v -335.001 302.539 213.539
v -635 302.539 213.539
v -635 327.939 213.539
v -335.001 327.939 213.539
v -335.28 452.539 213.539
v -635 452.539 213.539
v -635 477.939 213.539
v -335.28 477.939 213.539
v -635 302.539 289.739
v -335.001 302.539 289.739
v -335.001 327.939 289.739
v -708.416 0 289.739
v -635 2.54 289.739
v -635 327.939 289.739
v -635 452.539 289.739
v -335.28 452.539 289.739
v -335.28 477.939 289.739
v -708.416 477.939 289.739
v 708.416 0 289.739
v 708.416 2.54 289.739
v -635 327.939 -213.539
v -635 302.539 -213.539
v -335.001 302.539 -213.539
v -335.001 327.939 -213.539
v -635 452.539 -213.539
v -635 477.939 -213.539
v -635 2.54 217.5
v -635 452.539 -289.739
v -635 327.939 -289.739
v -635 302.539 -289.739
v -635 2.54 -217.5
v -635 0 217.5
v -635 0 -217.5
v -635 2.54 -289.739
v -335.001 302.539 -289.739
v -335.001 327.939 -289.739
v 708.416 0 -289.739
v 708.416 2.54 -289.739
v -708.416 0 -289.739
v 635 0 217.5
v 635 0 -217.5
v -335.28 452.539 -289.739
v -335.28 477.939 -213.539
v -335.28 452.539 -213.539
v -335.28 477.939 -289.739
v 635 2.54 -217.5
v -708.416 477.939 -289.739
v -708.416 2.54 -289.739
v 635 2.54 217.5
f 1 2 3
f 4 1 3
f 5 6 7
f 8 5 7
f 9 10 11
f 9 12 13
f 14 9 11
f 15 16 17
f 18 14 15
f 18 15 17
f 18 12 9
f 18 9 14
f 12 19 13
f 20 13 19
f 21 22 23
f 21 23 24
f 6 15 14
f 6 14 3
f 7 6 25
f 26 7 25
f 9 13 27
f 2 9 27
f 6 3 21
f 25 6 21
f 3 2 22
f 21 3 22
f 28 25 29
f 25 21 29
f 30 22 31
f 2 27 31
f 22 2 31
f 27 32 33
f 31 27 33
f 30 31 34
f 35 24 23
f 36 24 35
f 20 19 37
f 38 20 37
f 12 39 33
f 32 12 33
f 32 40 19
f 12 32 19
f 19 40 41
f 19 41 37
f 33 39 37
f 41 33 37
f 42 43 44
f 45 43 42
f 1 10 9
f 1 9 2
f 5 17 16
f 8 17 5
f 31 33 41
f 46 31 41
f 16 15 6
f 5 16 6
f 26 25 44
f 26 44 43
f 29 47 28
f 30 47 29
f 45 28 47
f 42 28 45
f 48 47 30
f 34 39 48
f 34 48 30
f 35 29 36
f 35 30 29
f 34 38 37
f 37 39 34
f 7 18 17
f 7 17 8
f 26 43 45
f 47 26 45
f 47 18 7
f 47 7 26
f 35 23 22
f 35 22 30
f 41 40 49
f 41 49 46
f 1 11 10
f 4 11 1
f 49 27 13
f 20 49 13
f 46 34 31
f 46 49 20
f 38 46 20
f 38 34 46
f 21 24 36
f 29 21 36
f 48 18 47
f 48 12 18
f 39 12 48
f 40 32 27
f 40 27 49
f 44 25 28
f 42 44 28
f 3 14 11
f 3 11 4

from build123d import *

# Parameters (mm, degrees)
SKETCH1_W           = 1416.83235241
SKETCH1_H           = 579.478309122
SKETCH1_W_2         = 1270
SKETCH1_H_2         = 434.999892
BOSS_EXTRUDE1_DEPTH = 2.54
SKETCH2_W           = 73.416176205
SKETCH2_H           = 579.478309122
BOSS_EXTRUDE2_DEPTH = 327.9394
SKETCH3_W           = 76.2
SKETCH3_H           = 25.4
BOSS_EXTRUDE3_DEPTH = 299.9994
SKETCH4_W           = 73.416176205
SKETCH4_H           = 579.478309122
BOSS_EXTRUDE4_DEPTH = 149.999954
SKETCH5_W           = 76.2
SKETCH5_H           = 25.4
BOSS_EXTRUDE5_DEPTH = 299.72


with BuildPart() as part:
    # Sketch1 → Boss-Extrude1 (new body)
    with BuildSketch(Plane(origin=(0, 0, 0), x_dir=(1, 0, 0), z_dir=(0, 1, 0))):
        Rectangle(SKETCH1_W, SKETCH1_H)
        Rectangle(SKETCH1_W_2, SKETCH1_H_2, mode=Mode.SUBTRACT)
    extrude(amount=BOSS_EXTRUDE1_DEPTH)

    # Sketch2 → Boss-Extrude2 (add)
    with BuildSketch(Plane.XZ):
        with Locations((-671.708088103, 0)):
            Rectangle(SKETCH2_W, SKETCH2_H)
    extrude(amount=-BOSS_EXTRUDE2_DEPTH)

    # Sketch3 → Boss-Extrude3 (add)
    with BuildSketch(Plane(origin=(-635, 0, 0), x_dir=(0, 0, -1), z_dir=(1, 0, 0))):
        with Locations((-251.639154561, 315.2394)):
            Rectangle(SKETCH3_W, SKETCH3_H)
        with Locations((251.639154561, 315.2394)):
            Rectangle(SKETCH3_W, SKETCH3_H)
    extrude(amount=BOSS_EXTRUDE3_DEPTH)

    # Sketch4 → Boss-Extrude4 (add)
    with BuildSketch(Plane(origin=(0, 327.9394, 0), x_dir=(1, 0, 0), z_dir=(0, 1, 0))):
        with Locations((-671.708088103, 0)):
            Rectangle(SKETCH4_W, SKETCH4_H)
    extrude(amount=BOSS_EXTRUDE4_DEPTH)

    # Sketch5 → Boss-Extrude5 (add)
    with BuildSketch(Plane(origin=(-635, 0, 0), x_dir=(0, 0, -1), z_dir=(1, 0, 0))):
        with Locations((-251.639154561, 465.239354)):
            Rectangle(SKETCH5_W, SKETCH5_H)
        with Locations((251.639154561, 465.239354)):
            Rectangle(SKETCH5_W, SKETCH5_H)
    extrude(amount=BOSS_EXTRUDE5_DEPTH)


solid = part.part
